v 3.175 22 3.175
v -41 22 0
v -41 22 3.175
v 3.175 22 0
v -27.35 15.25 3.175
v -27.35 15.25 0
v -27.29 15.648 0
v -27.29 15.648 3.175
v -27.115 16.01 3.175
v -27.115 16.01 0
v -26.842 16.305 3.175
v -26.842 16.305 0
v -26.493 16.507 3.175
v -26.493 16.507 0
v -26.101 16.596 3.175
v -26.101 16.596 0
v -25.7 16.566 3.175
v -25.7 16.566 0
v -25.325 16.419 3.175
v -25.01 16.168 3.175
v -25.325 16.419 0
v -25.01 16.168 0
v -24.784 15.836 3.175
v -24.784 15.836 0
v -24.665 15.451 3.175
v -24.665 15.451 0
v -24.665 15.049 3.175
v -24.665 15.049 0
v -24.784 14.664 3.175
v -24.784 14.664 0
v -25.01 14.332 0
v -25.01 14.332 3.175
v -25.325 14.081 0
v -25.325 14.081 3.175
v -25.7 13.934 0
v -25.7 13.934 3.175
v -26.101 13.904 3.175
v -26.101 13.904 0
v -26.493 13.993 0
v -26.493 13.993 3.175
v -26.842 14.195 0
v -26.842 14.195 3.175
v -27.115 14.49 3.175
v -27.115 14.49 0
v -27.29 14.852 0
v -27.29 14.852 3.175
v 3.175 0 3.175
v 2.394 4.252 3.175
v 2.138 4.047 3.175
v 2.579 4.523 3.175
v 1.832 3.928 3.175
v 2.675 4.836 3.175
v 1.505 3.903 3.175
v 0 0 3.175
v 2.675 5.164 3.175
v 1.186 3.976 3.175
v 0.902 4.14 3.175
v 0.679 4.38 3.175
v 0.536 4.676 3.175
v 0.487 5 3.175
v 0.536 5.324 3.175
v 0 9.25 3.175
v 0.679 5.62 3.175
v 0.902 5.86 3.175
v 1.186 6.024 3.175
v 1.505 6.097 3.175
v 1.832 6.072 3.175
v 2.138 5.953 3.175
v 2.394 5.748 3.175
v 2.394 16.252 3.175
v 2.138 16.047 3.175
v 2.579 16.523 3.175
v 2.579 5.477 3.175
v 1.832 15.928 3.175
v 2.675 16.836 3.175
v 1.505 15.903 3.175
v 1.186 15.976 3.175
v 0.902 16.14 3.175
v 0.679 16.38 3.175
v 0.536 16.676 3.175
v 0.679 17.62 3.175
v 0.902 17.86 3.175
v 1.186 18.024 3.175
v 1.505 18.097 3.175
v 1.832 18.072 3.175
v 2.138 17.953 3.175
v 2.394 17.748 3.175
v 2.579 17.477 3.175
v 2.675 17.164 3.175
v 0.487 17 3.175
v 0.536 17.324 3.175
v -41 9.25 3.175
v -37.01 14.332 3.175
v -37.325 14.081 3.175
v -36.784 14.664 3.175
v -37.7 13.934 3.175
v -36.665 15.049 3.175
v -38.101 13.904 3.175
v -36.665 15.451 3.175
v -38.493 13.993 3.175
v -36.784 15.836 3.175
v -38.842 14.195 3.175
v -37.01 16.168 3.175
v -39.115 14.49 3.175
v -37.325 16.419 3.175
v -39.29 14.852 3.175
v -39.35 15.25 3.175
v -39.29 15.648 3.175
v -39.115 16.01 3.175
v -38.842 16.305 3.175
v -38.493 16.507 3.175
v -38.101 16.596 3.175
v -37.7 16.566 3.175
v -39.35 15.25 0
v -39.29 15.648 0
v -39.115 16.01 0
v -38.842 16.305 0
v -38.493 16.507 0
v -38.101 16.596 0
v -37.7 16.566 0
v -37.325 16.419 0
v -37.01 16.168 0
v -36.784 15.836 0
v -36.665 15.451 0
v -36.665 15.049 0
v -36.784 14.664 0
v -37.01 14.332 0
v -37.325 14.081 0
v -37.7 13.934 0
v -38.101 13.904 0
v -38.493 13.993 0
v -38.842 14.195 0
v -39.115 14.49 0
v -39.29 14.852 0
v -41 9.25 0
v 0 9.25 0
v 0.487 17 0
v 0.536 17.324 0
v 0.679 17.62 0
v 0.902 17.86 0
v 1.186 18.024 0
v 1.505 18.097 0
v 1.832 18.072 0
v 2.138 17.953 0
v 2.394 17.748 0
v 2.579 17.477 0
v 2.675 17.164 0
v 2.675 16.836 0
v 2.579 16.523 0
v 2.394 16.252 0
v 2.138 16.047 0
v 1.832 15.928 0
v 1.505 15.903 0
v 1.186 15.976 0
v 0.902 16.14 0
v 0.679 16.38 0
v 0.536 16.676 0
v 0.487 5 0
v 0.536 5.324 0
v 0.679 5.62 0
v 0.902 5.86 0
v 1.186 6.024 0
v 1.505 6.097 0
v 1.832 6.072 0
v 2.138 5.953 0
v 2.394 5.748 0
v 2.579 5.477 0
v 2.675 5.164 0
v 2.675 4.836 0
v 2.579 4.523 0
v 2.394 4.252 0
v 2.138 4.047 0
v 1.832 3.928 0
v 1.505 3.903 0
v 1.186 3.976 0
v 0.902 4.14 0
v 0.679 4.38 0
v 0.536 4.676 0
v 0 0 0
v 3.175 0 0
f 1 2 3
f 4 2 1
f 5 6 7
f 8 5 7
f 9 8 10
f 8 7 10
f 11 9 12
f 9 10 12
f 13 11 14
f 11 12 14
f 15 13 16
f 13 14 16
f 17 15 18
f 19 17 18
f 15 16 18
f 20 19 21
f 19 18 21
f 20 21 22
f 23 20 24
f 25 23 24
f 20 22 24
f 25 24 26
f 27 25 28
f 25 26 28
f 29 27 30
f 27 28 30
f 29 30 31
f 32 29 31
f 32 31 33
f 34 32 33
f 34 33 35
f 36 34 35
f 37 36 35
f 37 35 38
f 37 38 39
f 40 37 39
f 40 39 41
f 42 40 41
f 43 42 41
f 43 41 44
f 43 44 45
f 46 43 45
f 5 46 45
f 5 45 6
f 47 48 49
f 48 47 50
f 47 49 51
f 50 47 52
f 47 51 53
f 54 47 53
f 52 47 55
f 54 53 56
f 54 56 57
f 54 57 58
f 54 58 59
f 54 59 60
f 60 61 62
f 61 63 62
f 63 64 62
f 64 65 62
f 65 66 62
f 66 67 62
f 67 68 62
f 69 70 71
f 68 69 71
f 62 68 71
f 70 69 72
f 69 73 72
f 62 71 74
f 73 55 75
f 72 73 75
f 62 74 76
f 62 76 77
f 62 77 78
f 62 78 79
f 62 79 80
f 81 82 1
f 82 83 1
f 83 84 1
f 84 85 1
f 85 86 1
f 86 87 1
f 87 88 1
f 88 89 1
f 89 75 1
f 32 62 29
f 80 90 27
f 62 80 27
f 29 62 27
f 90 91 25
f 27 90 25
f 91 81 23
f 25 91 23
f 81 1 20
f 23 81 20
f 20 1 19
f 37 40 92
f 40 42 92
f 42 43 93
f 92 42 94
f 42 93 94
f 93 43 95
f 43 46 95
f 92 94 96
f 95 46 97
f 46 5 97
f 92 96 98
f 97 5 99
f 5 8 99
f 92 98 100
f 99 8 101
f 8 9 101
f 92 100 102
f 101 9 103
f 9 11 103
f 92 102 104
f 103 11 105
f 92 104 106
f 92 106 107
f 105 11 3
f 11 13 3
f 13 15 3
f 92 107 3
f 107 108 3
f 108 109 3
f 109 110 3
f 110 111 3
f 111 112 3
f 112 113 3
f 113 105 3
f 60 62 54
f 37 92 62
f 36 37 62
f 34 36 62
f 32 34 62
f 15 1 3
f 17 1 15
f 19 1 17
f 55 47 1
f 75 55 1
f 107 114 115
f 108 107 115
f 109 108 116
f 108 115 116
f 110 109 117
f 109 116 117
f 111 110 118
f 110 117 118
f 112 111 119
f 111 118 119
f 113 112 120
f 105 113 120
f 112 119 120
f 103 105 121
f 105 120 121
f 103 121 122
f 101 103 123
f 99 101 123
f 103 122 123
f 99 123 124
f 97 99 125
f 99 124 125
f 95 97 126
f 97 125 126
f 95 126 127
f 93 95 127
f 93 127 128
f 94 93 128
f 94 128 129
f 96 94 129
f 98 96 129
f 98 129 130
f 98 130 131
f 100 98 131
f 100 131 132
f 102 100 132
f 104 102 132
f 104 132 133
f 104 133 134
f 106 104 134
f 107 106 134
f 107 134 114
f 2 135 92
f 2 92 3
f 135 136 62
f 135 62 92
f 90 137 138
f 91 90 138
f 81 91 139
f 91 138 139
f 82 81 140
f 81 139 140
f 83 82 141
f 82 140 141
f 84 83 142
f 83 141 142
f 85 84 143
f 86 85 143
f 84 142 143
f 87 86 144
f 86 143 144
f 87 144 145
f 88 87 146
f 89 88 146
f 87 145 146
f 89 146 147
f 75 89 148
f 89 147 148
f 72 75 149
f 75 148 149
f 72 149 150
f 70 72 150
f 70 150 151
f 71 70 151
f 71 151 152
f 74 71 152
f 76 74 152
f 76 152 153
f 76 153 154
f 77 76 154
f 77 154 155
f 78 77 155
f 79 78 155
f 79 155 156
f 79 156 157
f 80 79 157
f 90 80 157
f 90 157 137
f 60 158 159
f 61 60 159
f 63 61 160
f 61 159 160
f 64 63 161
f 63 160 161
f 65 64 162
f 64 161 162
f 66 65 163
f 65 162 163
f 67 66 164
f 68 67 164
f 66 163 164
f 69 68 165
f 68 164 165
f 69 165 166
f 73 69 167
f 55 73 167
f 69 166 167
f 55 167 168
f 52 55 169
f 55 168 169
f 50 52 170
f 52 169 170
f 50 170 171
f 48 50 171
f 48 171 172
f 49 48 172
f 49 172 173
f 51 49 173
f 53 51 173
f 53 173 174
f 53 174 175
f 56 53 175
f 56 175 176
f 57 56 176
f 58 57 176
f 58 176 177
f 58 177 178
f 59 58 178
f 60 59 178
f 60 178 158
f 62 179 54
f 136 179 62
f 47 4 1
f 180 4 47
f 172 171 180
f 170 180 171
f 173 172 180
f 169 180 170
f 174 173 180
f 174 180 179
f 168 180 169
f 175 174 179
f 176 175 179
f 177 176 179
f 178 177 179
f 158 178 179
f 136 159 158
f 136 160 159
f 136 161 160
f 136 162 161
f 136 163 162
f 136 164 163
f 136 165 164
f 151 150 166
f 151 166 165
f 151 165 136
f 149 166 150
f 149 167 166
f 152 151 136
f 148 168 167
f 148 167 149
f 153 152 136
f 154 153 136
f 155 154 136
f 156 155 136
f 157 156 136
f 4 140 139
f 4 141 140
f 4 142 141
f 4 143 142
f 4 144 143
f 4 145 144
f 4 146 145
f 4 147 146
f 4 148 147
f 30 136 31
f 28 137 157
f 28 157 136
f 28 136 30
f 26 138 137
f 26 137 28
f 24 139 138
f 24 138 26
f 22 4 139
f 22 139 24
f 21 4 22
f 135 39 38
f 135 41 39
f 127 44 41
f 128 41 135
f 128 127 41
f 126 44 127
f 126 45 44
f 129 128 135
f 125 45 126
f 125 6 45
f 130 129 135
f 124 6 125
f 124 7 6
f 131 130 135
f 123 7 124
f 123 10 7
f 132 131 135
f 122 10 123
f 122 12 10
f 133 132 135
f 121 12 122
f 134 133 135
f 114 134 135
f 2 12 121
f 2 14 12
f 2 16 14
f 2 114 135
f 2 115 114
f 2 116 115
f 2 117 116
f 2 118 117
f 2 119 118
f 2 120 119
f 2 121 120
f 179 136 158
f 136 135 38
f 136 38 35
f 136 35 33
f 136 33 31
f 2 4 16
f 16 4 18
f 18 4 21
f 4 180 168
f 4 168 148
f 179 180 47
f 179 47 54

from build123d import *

# Parameters (mm, degrees)
BOSS_EXTRUDE1_DEPTH    = 3.175
M2_5_CLEARANCE_HOLE1_D = 2.7
M2_CLEARANCE_HOLE1_D   = 2.2


with BuildPart() as part:
    # Sketch1 → Boss-Extrude1 (new body)
    with BuildSketch(Plane.XY):
        Polygon((0, 0), (0, 9.25), (-41, 9.25), (-41, 22), (3.175, 22), (3.175, 0), align=None)
    extrude(amount=BOSS_EXTRUDE1_DEPTH)

    # M2.5 Clearance Hole1 (through all)
    with Locations(Plane.XY.offset(3.175)):
        with Locations((-38, 15.25), (-26, 15.25)):
            Hole(M2_5_CLEARANCE_HOLE1_D / 2)

    # M2 Clearance Hole1 (through all)
    with Locations(Plane.XY.offset(3.175)):
        with Locations((1.5875, 17), (1.5875, 5)):
            Hole(M2_CLEARANCE_HOLE1_D / 2)


solid = part.part
